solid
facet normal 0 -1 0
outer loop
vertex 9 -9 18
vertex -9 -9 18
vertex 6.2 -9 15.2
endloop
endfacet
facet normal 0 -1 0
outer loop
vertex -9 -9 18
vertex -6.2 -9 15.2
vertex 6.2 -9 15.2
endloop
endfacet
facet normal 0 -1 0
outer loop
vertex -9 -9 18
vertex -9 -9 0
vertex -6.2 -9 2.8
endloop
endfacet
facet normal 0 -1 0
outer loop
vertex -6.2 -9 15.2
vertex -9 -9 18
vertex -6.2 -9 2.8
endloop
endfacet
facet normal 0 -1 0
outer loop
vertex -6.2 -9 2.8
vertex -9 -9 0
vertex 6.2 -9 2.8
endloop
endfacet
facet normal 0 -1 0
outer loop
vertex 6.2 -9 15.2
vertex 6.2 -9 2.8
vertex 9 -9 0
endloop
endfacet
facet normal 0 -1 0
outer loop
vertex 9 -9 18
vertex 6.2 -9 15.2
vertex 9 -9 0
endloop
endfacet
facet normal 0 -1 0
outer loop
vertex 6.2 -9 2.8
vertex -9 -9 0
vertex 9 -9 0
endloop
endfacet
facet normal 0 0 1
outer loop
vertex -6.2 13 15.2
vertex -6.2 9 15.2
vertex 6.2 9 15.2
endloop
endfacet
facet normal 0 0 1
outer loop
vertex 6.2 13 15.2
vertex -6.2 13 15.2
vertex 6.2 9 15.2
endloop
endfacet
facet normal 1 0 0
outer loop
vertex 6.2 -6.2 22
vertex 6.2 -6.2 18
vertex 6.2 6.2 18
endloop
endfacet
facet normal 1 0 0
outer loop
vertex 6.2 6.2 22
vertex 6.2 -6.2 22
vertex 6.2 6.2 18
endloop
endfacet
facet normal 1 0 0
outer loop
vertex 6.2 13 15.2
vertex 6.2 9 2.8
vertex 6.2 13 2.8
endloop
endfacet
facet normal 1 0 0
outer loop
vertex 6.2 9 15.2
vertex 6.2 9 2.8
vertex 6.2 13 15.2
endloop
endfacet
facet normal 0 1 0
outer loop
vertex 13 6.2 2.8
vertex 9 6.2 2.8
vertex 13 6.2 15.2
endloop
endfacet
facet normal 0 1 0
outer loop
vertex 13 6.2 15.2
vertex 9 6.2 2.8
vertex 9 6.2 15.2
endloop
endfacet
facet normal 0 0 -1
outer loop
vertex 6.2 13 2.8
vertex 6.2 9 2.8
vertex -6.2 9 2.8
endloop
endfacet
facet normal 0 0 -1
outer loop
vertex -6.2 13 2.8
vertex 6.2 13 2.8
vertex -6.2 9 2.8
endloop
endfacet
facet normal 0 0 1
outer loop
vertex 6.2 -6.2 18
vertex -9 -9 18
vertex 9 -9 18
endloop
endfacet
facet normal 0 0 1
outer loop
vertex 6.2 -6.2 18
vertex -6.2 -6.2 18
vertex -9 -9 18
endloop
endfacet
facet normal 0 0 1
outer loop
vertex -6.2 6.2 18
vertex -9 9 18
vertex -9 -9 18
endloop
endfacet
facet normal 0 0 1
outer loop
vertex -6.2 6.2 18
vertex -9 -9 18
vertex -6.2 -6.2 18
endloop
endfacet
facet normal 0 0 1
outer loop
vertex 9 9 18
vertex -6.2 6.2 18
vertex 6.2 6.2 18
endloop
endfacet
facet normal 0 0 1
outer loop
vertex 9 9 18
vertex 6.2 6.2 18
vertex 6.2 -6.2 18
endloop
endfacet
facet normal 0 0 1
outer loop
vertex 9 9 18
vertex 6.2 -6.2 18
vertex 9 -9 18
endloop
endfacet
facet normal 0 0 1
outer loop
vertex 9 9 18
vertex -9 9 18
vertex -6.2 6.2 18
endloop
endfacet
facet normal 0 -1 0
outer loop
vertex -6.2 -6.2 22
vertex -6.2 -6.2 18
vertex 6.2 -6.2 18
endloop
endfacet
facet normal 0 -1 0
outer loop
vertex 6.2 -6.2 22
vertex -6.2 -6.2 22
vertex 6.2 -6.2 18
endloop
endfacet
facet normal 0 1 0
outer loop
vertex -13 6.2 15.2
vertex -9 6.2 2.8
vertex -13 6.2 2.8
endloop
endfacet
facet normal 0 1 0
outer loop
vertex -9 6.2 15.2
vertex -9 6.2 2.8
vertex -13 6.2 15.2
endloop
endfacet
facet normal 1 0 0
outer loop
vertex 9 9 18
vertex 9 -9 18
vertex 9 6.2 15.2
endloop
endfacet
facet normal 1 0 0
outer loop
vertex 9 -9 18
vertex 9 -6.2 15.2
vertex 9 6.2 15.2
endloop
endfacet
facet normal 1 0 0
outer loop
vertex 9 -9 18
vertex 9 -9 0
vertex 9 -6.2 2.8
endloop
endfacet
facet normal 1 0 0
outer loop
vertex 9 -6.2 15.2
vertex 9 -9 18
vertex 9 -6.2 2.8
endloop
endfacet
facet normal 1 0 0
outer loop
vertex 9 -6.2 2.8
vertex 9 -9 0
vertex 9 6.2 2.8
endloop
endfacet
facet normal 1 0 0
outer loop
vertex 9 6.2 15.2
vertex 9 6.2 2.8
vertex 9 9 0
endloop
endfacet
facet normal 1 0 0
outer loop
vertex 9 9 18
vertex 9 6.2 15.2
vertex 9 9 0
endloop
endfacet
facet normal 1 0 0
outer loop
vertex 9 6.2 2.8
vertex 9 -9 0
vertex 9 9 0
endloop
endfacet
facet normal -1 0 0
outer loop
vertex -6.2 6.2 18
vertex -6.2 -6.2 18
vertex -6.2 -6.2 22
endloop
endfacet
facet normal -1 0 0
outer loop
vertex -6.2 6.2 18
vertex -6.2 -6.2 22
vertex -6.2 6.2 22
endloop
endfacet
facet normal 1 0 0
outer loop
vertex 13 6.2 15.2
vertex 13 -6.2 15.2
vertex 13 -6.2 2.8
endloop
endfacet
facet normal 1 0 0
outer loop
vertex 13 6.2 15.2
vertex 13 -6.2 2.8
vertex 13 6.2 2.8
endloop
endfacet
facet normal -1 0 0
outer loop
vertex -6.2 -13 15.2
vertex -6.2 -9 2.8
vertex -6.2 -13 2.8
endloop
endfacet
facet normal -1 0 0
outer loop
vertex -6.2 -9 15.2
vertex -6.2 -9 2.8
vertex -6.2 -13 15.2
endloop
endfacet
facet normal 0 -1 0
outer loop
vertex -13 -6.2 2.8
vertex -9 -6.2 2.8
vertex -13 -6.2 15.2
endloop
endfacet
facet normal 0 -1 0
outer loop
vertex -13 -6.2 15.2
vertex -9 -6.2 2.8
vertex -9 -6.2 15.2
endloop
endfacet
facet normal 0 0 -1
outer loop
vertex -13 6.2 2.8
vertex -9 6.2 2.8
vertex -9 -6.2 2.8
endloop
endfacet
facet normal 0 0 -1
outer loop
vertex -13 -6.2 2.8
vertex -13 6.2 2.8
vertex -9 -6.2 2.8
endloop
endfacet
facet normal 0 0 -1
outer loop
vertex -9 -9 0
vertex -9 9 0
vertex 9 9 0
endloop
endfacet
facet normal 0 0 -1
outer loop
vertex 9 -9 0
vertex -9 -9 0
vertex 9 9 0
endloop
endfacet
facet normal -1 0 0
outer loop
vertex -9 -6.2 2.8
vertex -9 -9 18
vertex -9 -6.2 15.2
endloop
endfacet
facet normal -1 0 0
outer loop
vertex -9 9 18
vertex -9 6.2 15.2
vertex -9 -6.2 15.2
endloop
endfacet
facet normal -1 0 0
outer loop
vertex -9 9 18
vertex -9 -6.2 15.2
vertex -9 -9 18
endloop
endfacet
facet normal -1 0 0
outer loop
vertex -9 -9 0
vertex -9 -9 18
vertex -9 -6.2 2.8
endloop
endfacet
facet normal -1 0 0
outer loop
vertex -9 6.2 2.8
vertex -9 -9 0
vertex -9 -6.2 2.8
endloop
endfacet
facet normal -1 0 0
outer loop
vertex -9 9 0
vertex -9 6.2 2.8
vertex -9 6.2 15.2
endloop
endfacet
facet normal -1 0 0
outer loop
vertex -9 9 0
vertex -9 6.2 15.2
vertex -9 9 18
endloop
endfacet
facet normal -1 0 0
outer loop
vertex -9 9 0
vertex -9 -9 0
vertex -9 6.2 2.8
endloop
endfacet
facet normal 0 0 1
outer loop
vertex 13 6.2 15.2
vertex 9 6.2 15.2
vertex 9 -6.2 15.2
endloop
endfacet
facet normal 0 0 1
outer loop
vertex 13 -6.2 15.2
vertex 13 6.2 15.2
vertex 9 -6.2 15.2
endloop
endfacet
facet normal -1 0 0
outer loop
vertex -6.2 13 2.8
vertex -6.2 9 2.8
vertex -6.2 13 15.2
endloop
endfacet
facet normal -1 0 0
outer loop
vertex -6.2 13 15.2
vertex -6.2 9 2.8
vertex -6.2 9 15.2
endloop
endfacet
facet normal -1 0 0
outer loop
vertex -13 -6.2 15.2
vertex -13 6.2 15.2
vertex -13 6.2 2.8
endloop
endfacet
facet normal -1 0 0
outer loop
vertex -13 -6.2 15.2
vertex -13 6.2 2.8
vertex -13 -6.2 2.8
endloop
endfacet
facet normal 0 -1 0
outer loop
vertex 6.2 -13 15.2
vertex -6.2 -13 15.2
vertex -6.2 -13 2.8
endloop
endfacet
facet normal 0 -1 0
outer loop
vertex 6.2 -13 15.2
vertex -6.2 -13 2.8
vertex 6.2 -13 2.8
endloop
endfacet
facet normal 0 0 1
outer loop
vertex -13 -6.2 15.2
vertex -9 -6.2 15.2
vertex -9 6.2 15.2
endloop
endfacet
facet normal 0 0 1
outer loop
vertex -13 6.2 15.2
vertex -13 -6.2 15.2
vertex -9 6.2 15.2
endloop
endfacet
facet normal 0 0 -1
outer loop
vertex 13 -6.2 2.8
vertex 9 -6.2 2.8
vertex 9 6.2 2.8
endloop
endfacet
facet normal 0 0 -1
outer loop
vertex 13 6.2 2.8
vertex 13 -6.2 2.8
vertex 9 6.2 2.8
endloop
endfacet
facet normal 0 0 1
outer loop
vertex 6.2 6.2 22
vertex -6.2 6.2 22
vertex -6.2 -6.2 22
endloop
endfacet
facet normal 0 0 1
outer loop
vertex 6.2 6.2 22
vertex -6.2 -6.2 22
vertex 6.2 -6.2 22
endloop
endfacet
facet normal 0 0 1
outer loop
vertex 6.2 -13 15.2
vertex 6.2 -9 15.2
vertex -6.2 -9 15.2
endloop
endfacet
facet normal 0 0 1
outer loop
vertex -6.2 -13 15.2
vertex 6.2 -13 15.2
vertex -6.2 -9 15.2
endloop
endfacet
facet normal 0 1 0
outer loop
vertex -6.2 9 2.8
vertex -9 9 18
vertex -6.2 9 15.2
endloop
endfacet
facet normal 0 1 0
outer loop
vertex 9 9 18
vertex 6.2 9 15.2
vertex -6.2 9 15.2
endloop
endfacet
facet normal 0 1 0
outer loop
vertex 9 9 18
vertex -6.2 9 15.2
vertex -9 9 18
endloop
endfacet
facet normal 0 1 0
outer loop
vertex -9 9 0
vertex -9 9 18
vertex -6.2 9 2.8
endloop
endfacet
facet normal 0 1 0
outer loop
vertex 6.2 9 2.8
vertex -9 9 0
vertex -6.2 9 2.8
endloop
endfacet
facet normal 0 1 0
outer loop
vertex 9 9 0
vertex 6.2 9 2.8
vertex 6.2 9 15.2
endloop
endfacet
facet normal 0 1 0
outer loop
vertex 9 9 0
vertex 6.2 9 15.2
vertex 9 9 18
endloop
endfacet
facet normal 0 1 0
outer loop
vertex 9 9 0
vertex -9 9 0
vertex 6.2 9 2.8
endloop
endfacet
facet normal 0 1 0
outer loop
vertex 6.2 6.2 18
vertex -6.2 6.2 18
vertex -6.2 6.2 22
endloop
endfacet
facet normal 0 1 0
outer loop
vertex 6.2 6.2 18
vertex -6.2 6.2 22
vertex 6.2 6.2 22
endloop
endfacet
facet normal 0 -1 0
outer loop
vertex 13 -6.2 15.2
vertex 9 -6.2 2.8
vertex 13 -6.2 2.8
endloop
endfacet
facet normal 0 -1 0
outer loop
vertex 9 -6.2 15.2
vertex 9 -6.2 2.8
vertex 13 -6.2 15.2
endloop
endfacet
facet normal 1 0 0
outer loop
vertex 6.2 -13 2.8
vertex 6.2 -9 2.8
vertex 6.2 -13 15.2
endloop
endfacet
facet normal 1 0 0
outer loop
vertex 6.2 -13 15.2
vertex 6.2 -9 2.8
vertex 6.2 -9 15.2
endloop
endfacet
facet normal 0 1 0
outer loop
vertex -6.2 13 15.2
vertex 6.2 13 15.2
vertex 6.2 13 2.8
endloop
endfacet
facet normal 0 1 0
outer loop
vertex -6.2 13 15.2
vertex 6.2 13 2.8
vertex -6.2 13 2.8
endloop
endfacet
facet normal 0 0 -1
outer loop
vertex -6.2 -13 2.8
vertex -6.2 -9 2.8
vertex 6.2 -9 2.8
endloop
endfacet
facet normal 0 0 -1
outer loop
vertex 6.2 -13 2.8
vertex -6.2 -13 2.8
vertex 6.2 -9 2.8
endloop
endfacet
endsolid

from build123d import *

# Parameters (mm, degrees)
F0_W      = 18
F0_H      = 18
F1_DEPTH  = 18
F2_W      = 12.4
F2_H      = 12.4
F3_DEPTH  = 4
F4_DEPTH  = 4
F5_W      = 6.2
F5_H      = 12.4
F6_DEPTH  = 4
F7_W      = 6.2
F7_H      = 12.4
F8_DEPTH  = 4
F9_W      = 6.2
F9_H      = 12.4
F10_DEPTH = 4
F11_W     = 6.2
F11_H     = 12.4
F12_DEPTH = 4


with BuildPart() as f1:
    # F0 (on Top) → F1 (new body)
    with BuildSketch(Plane.XY):
        Rectangle(F0_W, F0_H)
    extrude(amount=F1_DEPTH)

    # F2 (on face) → F3 (join)
    with BuildSketch(Plane.XY.offset(18)):
        Rectangle(F2_W, F2_H)
    extrude(amount=F3_DEPTH)

    # F2 (on face) → F4 (join)
    with BuildSketch(Plane.XY.offset(18)):
        Rectangle(F2_W, F2_H)
    extrude(amount=-F4_DEPTH)

    # F5 (on face) → F6 (join)
    with BuildSketch(Plane(origin=(0, 9, 0), x_dir=(-1, 0, 0), z_dir=(0, 1, 0))):
        with Locations((3.1, 9)):
            Rectangle(F5_W, F5_H)
        with Locations((-3.1, 9)):
            Rectangle(F5_W, F5_H)
    extrude(amount=F6_DEPTH)

    # F7 (on face) → F8 (join)
    with BuildSketch(Plane(origin=(-9, 0, 0), x_dir=(0, -1, 0), z_dir=(-1, 0, 0))):
        with Locations((3.1, 9)):
            Rectangle(F7_W, F7_H)
        with Locations((-3.1, 9)):
            Rectangle(F7_W, F7_H)
    extrude(amount=F8_DEPTH)

    # F9 (on face) → F10 (join)
    with BuildSketch(Plane.YZ.offset(9)):
        with Locations((3.1, 9)):
            Rectangle(F9_W, F9_H)
        with Locations((-3.1, 9)):
            Rectangle(F9_W, F9_H)
    extrude(amount=F10_DEPTH)

    # F11 (on face) → F12 (join)
    with BuildSketch(Plane.XZ.offset(9)):
        with Locations((3.1, 9)):
            Rectangle(F11_W, F11_H)
        with Locations((-3.1, 9)):
            Rectangle(F11_W, F11_H)
    extrude(amount=F12_DEPTH)


solid = f1.part
